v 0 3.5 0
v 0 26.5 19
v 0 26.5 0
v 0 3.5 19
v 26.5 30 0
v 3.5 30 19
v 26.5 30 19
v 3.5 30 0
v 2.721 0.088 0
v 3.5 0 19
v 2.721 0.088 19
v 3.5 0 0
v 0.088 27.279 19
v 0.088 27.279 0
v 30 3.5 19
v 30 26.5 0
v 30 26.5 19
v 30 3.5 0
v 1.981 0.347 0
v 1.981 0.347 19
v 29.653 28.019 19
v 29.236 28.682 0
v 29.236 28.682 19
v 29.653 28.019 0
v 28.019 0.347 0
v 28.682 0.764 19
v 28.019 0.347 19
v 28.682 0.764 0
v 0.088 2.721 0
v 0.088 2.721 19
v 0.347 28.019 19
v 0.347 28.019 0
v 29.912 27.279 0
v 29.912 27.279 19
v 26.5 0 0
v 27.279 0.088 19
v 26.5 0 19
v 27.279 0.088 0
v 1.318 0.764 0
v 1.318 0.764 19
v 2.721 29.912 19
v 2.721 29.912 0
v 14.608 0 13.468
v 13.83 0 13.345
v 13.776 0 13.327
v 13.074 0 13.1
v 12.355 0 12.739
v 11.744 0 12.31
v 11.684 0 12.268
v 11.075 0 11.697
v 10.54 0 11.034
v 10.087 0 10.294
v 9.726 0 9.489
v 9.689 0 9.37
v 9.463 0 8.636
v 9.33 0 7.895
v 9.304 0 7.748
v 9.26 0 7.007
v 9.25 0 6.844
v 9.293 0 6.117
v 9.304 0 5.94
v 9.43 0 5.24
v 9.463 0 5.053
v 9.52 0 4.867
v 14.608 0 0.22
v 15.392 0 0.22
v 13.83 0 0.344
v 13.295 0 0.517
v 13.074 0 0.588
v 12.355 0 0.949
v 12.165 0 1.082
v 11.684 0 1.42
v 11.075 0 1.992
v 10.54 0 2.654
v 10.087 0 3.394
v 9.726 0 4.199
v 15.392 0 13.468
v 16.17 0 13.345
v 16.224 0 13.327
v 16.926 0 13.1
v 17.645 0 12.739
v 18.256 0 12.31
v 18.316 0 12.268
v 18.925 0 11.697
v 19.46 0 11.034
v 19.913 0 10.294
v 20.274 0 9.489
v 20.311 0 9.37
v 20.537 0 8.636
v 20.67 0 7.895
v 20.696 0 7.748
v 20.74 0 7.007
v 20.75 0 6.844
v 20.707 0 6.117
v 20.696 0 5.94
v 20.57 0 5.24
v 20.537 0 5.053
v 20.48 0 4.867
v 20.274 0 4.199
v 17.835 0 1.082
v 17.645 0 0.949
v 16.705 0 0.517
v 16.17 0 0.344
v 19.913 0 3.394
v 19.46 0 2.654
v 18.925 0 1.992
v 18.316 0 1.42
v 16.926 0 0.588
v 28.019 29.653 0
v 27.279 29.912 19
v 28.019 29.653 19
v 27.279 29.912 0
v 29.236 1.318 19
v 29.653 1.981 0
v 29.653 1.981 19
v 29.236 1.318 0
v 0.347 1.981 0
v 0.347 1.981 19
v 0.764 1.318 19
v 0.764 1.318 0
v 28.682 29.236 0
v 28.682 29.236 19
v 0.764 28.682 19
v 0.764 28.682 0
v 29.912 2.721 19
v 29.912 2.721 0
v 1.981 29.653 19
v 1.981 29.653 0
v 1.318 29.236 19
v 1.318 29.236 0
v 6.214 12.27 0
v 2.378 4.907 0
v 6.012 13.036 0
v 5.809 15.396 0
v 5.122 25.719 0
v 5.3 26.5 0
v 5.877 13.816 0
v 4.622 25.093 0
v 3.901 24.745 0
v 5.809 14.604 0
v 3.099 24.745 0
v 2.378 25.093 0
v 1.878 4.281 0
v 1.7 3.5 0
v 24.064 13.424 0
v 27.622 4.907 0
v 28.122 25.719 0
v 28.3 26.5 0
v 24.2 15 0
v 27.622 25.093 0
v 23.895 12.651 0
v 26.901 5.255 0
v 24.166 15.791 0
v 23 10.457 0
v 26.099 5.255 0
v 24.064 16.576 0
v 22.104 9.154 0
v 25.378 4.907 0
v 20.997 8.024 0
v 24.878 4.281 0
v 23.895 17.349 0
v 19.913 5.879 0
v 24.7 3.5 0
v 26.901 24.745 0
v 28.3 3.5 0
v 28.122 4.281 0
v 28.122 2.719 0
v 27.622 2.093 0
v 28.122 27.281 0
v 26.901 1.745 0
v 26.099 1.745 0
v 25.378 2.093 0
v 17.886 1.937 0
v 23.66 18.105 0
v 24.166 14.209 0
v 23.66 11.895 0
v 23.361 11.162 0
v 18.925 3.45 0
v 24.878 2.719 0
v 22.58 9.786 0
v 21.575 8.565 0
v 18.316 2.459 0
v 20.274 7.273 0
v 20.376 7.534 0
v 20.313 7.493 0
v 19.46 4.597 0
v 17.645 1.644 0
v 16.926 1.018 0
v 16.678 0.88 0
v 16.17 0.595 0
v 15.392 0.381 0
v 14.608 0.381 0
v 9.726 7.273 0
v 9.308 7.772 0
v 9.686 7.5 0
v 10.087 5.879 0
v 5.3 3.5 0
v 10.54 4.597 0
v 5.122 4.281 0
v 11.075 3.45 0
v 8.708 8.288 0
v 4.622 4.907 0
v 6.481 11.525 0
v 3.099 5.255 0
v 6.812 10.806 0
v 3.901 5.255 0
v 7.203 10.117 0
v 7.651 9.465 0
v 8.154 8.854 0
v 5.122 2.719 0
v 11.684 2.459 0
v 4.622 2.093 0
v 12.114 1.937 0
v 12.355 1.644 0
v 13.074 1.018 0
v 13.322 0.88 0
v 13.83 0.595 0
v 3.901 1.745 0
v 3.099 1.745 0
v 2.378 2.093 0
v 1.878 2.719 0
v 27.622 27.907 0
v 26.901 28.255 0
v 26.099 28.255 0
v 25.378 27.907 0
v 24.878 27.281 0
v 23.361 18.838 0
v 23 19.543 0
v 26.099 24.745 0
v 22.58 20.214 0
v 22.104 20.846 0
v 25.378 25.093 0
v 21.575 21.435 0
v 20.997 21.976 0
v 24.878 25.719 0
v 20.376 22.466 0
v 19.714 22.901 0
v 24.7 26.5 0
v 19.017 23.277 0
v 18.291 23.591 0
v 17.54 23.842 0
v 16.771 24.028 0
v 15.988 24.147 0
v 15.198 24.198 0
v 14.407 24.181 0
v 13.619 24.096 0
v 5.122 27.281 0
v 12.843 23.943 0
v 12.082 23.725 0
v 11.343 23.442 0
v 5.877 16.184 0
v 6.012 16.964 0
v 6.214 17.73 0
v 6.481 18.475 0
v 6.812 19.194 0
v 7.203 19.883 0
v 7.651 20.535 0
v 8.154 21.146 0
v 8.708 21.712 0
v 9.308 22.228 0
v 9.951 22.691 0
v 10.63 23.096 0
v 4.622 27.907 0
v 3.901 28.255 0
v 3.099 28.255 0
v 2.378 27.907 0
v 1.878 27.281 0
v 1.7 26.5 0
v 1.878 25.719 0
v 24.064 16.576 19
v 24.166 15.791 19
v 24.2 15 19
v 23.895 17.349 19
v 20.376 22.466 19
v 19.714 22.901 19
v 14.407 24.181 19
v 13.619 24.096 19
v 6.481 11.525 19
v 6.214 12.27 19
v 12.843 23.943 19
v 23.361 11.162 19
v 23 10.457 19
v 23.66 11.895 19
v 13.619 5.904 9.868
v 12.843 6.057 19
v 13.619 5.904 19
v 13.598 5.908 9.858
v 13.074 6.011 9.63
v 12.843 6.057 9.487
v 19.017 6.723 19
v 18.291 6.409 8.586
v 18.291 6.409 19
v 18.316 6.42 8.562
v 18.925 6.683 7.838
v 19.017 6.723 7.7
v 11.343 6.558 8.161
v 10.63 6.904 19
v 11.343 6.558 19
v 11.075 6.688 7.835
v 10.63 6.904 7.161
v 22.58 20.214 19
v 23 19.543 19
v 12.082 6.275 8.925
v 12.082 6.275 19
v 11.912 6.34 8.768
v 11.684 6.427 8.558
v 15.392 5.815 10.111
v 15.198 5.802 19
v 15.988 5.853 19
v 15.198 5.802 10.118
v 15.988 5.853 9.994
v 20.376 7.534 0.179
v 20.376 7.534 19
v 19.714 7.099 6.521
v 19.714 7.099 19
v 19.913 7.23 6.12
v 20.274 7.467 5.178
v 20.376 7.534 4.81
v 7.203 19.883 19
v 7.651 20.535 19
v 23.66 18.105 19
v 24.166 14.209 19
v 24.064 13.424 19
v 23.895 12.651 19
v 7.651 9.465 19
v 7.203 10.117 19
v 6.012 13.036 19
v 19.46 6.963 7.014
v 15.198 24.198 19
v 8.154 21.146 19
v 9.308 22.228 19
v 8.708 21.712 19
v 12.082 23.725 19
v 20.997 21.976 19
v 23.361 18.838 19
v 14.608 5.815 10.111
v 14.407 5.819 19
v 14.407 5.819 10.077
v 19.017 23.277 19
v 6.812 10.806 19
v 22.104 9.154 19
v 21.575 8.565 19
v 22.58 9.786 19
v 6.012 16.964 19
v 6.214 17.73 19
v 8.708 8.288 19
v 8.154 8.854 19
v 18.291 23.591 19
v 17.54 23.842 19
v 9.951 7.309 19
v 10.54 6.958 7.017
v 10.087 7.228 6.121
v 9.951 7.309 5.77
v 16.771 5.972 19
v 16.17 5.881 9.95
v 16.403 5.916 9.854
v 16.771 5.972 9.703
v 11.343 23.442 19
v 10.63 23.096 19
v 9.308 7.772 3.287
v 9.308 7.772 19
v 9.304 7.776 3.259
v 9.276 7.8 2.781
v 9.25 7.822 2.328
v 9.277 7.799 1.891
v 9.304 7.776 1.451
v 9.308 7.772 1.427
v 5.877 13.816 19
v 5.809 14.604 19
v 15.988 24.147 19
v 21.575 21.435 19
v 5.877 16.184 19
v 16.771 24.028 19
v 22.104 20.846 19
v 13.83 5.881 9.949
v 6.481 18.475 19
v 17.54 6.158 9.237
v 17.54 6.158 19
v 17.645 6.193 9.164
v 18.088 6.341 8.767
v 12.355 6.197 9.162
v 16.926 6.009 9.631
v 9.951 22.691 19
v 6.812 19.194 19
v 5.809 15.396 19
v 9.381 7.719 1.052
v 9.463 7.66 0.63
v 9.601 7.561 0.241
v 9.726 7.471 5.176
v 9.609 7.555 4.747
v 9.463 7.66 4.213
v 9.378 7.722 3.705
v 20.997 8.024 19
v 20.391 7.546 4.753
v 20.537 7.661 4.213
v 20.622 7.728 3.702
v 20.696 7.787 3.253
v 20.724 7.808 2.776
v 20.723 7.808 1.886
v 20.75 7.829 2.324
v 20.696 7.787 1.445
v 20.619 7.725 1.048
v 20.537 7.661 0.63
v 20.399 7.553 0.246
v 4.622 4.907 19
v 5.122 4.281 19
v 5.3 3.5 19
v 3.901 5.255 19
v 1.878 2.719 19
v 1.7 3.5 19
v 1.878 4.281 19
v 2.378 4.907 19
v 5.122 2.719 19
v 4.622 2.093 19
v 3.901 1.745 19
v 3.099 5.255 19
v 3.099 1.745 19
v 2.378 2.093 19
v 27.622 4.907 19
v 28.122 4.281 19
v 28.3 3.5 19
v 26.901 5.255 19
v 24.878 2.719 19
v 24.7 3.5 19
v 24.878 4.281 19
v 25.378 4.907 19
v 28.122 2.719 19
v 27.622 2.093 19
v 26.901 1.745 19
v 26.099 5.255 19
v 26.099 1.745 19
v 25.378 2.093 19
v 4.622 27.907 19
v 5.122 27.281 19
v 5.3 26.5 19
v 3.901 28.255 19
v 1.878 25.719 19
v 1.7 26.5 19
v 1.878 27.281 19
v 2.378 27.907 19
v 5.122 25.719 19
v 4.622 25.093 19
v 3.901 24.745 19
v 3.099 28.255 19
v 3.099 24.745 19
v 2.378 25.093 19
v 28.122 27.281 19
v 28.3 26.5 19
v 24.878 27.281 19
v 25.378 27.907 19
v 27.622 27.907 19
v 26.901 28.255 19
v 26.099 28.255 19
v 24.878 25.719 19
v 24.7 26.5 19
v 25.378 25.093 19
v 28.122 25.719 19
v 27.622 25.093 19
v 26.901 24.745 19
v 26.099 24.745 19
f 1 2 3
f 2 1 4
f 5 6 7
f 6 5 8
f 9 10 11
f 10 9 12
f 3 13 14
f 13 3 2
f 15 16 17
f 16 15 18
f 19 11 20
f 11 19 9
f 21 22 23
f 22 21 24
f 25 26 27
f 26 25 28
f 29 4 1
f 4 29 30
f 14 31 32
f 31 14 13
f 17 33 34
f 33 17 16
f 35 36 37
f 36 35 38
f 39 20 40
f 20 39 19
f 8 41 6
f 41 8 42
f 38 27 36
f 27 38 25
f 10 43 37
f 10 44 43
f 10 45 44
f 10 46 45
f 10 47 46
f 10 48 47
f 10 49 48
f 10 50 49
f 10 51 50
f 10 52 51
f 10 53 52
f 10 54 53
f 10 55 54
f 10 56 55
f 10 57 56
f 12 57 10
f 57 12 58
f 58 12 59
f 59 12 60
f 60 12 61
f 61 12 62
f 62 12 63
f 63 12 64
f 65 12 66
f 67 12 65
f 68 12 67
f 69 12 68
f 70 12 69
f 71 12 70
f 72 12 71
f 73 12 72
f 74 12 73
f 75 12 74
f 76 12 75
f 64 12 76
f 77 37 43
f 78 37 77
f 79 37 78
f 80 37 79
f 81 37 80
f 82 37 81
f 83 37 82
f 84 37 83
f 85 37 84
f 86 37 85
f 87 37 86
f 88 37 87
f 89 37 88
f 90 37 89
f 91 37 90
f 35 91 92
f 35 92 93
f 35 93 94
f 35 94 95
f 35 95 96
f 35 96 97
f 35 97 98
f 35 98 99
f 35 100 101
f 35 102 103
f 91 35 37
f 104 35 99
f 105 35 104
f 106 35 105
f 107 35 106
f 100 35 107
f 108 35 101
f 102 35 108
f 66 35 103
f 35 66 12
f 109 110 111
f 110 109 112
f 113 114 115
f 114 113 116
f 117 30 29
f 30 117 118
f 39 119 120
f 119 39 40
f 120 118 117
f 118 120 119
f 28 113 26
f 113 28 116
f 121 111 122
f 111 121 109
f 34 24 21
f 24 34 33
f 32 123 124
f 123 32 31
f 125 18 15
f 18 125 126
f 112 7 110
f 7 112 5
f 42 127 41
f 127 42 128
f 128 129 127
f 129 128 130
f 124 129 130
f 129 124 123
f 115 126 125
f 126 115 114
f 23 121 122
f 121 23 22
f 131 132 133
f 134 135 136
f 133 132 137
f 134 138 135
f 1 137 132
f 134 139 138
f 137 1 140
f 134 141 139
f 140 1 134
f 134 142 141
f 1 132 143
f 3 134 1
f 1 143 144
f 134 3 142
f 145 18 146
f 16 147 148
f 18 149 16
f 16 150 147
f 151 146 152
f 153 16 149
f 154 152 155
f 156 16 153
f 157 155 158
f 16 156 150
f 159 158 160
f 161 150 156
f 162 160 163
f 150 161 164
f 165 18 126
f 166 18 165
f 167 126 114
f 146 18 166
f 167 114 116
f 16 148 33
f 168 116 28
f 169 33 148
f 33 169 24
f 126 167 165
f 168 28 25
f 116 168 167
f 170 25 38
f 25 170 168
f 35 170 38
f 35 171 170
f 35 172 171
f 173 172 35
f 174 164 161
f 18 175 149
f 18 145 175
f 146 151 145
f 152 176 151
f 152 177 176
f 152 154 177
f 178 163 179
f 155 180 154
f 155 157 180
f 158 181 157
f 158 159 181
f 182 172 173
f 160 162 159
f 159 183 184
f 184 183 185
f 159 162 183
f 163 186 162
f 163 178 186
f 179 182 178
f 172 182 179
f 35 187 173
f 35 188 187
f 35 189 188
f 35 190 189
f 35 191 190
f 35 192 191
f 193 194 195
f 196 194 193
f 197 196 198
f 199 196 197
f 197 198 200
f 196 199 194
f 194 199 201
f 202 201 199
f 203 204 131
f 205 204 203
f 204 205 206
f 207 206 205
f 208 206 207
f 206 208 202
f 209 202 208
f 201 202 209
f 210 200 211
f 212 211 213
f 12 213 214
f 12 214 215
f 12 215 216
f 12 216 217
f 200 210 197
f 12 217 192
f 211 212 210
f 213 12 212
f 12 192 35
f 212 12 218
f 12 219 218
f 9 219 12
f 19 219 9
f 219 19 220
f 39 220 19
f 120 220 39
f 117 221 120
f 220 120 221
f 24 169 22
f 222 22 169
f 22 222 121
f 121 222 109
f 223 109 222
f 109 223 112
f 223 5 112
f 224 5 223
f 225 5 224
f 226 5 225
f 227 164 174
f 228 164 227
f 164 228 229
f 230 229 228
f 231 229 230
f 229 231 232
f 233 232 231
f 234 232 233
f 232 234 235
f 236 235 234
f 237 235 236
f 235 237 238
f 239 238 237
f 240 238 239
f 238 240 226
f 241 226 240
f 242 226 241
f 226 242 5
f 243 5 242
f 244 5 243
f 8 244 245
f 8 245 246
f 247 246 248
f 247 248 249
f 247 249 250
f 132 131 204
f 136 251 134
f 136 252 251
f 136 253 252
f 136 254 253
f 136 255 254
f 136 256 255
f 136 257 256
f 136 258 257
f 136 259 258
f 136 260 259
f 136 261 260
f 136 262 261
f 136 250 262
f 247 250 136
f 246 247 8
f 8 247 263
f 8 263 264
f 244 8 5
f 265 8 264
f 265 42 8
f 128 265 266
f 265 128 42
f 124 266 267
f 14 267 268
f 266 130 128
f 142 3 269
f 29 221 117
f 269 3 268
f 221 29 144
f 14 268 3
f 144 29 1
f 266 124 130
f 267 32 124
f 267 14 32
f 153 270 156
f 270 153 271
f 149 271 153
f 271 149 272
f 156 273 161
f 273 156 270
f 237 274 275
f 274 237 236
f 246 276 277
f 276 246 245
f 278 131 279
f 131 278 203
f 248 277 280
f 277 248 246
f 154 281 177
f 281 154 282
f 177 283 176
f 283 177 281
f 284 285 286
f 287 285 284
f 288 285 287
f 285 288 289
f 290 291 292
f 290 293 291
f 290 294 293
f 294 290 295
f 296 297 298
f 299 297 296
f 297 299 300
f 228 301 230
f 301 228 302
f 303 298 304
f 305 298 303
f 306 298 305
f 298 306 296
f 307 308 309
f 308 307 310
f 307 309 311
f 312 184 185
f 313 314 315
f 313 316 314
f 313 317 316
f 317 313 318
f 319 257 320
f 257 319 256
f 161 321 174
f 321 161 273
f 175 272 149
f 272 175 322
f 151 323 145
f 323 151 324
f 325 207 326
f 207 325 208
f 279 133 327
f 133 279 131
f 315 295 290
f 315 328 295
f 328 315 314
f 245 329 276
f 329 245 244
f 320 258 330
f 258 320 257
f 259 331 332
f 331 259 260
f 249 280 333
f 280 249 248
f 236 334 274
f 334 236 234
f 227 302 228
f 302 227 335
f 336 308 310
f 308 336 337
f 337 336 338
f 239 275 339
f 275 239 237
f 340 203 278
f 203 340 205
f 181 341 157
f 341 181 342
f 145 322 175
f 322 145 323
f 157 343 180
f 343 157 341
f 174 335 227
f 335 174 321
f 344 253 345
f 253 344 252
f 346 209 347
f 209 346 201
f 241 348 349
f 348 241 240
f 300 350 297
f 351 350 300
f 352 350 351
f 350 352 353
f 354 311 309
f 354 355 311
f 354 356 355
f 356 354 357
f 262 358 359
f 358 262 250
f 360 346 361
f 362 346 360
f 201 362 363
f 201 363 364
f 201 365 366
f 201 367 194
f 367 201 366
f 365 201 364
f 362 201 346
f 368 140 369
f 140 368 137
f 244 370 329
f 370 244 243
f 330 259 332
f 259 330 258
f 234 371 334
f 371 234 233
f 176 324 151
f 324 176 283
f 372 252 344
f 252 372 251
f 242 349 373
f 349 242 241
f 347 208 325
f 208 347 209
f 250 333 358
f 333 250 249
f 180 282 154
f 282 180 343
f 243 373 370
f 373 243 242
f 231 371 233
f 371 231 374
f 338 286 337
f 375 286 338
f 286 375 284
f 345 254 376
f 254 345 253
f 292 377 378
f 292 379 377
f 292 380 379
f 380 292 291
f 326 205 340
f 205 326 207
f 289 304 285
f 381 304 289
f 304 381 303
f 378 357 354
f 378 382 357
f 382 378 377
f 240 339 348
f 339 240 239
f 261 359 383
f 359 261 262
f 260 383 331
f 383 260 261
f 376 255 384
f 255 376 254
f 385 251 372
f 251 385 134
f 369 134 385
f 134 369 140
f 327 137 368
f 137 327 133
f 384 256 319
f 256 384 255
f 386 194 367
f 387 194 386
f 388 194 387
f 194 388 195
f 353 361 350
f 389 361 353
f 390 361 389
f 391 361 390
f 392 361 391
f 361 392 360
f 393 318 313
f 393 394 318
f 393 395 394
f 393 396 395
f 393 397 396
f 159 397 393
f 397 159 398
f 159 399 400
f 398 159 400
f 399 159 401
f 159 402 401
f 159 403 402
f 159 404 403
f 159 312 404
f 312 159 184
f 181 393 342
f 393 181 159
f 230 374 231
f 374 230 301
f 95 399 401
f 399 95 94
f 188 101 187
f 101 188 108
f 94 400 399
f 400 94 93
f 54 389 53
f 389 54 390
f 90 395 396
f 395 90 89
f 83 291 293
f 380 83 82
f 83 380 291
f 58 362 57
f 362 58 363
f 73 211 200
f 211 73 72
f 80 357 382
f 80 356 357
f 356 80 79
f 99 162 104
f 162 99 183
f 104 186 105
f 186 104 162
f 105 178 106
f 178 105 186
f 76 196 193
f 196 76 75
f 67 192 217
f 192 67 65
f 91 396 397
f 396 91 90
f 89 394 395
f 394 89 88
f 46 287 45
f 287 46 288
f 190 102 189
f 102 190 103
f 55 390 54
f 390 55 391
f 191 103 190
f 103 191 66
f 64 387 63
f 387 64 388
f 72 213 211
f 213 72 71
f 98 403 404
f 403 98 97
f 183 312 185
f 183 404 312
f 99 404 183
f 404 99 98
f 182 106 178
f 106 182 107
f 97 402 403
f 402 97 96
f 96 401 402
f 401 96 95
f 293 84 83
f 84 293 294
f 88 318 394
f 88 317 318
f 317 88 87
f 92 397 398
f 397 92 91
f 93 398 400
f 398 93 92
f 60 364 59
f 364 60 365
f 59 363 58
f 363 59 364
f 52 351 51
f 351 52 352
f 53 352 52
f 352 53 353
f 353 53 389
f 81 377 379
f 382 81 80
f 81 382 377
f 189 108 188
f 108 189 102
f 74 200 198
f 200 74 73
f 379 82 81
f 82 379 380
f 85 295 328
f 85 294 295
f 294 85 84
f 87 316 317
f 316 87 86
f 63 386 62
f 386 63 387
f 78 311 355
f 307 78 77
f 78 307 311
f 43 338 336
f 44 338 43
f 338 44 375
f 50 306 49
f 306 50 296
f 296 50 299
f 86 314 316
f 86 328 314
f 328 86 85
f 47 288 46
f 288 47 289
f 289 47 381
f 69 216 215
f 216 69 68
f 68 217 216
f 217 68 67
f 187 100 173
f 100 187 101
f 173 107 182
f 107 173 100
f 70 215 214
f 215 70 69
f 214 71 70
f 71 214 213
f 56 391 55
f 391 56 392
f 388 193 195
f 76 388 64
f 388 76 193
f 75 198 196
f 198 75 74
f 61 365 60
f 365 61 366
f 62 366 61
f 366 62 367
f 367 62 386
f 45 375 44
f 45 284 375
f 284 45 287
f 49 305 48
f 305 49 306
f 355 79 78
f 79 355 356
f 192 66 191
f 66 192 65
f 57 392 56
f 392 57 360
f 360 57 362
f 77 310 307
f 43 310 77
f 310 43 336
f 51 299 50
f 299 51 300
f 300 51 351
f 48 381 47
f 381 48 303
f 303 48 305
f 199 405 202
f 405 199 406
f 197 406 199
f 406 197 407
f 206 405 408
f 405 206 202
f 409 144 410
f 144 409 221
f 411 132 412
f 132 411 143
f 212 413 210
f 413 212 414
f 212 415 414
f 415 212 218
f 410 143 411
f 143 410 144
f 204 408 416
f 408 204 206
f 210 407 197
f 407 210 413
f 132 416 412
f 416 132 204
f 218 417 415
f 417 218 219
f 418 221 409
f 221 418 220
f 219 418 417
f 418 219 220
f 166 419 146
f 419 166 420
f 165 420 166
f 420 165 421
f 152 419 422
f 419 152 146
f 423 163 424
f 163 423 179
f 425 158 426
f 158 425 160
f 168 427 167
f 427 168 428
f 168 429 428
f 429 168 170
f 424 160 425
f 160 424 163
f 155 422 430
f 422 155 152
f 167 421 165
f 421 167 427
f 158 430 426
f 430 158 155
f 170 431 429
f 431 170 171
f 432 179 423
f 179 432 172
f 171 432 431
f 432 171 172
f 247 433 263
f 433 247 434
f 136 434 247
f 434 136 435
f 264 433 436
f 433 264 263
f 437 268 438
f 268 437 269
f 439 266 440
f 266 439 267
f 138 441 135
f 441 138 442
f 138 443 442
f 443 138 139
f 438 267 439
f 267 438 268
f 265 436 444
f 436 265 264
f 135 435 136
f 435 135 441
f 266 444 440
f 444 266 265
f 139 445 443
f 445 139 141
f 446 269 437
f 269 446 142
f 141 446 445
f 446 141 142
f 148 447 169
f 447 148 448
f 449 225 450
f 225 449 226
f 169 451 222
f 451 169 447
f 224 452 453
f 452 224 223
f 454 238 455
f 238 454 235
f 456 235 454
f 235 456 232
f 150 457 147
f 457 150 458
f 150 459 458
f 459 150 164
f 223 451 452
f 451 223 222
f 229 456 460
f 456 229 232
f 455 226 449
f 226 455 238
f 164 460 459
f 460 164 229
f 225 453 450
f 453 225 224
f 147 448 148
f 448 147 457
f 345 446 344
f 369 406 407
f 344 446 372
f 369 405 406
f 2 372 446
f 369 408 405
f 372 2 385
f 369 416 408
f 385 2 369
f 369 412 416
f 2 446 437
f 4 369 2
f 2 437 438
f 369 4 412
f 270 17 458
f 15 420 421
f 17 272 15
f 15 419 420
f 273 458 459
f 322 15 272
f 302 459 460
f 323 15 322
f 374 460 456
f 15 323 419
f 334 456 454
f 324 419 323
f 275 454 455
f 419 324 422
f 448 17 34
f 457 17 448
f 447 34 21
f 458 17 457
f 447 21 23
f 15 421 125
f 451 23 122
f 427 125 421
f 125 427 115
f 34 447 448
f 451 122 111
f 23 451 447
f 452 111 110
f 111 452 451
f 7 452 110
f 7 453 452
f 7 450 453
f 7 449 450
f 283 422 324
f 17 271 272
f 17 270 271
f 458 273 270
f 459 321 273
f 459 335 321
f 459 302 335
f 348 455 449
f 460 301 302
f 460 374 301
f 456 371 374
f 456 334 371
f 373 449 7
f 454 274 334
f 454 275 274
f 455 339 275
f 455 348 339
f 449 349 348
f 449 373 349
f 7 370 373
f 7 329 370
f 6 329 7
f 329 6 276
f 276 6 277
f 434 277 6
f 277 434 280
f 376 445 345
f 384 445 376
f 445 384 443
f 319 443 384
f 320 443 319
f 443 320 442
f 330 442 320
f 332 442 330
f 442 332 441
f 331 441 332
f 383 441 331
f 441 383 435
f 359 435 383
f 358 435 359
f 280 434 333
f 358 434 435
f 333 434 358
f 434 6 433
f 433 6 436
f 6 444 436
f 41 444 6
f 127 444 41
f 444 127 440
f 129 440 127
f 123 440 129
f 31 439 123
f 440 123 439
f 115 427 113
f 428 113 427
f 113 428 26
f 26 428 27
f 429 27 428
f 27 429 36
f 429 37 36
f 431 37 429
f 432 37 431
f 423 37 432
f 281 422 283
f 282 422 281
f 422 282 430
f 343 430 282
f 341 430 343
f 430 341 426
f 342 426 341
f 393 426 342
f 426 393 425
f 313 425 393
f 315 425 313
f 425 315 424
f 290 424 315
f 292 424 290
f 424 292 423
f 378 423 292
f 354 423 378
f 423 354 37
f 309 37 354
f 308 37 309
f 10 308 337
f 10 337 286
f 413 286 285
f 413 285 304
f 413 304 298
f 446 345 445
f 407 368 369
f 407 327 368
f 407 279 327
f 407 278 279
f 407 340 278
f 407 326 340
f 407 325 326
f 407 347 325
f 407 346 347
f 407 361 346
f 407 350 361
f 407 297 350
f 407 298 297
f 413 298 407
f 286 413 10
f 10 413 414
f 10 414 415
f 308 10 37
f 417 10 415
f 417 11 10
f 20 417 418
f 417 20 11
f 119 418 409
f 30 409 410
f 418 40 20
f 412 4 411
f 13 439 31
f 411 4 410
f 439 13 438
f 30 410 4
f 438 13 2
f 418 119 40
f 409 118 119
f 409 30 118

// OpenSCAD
//Parametric brushless_motor mount.
//Oktay Gülmez, 15/10/2014.
//GNU_GPL_V3.

//Parameters:
printerLine_width=0.6;
mountHoles_width=23;
mountHoles_height=23;
mountHoles_diameter=3;
mount_lenght=19;
down_angle=0;
right_angle=0;
corner_radius=3.5;

viewSmooter=8;

mountHoles_radius=mountHoles_diameter/2+printerLine_width/2;

$fn=mountHoles_radius*viewSmooter;

difference(){
  union(){
    minkowski(){
     translate([corner_radius,corner_radius,0]) cube([mountHoles_width,mountHoles_height,mount_lenght+5]);
       cylinder(r=corner_radius, $fn=corner_radius*viewSmooter);
    }
  }
 translate([(2*corner_radius+mountHoles_width)/2,(2*corner_radius+mountHoles_height)/2,0]) cylinder(h=mount_lenght+10, r=mountHoles_width/2.5, $fn=(mountHoles_width/2.5)*viewSmooter);
 
 translate([(2*corner_radius+mountHoles_width)/2,-mountHoles_width/5,mount_lenght/2]) rotate([-120,0,0]) cylinder(h=mount_lenght+10, r=mountHoles_width/4, $fn=(mountHoles_width/4)*viewSmooter);

 translate([corner_radius,corner_radius,0]) cylinder(h=mount_lenght+10, r=mountHoles_radius);
 translate([corner_radius+mountHoles_width,corner_radius,0]) cylinder(h=mount_lenght+10, r=mountHoles_radius);
 translate([corner_radius,corner_radius+mountHoles_height,0]) cylinder(h=mount_lenght+10, r=mountHoles_radius);
 translate([corner_radius+mountHoles_width,corner_radius+mountHoles_height,0]) cylinder(h=mount_lenght+10, r=mountHoles_radius);

 translate([0,0,mount_lenght]) rotate([down_angle,-right_angle,0]) cube([mountHoles_width+3*corner_radius,mountHoles_height+3*corner_radius,10]);
}
